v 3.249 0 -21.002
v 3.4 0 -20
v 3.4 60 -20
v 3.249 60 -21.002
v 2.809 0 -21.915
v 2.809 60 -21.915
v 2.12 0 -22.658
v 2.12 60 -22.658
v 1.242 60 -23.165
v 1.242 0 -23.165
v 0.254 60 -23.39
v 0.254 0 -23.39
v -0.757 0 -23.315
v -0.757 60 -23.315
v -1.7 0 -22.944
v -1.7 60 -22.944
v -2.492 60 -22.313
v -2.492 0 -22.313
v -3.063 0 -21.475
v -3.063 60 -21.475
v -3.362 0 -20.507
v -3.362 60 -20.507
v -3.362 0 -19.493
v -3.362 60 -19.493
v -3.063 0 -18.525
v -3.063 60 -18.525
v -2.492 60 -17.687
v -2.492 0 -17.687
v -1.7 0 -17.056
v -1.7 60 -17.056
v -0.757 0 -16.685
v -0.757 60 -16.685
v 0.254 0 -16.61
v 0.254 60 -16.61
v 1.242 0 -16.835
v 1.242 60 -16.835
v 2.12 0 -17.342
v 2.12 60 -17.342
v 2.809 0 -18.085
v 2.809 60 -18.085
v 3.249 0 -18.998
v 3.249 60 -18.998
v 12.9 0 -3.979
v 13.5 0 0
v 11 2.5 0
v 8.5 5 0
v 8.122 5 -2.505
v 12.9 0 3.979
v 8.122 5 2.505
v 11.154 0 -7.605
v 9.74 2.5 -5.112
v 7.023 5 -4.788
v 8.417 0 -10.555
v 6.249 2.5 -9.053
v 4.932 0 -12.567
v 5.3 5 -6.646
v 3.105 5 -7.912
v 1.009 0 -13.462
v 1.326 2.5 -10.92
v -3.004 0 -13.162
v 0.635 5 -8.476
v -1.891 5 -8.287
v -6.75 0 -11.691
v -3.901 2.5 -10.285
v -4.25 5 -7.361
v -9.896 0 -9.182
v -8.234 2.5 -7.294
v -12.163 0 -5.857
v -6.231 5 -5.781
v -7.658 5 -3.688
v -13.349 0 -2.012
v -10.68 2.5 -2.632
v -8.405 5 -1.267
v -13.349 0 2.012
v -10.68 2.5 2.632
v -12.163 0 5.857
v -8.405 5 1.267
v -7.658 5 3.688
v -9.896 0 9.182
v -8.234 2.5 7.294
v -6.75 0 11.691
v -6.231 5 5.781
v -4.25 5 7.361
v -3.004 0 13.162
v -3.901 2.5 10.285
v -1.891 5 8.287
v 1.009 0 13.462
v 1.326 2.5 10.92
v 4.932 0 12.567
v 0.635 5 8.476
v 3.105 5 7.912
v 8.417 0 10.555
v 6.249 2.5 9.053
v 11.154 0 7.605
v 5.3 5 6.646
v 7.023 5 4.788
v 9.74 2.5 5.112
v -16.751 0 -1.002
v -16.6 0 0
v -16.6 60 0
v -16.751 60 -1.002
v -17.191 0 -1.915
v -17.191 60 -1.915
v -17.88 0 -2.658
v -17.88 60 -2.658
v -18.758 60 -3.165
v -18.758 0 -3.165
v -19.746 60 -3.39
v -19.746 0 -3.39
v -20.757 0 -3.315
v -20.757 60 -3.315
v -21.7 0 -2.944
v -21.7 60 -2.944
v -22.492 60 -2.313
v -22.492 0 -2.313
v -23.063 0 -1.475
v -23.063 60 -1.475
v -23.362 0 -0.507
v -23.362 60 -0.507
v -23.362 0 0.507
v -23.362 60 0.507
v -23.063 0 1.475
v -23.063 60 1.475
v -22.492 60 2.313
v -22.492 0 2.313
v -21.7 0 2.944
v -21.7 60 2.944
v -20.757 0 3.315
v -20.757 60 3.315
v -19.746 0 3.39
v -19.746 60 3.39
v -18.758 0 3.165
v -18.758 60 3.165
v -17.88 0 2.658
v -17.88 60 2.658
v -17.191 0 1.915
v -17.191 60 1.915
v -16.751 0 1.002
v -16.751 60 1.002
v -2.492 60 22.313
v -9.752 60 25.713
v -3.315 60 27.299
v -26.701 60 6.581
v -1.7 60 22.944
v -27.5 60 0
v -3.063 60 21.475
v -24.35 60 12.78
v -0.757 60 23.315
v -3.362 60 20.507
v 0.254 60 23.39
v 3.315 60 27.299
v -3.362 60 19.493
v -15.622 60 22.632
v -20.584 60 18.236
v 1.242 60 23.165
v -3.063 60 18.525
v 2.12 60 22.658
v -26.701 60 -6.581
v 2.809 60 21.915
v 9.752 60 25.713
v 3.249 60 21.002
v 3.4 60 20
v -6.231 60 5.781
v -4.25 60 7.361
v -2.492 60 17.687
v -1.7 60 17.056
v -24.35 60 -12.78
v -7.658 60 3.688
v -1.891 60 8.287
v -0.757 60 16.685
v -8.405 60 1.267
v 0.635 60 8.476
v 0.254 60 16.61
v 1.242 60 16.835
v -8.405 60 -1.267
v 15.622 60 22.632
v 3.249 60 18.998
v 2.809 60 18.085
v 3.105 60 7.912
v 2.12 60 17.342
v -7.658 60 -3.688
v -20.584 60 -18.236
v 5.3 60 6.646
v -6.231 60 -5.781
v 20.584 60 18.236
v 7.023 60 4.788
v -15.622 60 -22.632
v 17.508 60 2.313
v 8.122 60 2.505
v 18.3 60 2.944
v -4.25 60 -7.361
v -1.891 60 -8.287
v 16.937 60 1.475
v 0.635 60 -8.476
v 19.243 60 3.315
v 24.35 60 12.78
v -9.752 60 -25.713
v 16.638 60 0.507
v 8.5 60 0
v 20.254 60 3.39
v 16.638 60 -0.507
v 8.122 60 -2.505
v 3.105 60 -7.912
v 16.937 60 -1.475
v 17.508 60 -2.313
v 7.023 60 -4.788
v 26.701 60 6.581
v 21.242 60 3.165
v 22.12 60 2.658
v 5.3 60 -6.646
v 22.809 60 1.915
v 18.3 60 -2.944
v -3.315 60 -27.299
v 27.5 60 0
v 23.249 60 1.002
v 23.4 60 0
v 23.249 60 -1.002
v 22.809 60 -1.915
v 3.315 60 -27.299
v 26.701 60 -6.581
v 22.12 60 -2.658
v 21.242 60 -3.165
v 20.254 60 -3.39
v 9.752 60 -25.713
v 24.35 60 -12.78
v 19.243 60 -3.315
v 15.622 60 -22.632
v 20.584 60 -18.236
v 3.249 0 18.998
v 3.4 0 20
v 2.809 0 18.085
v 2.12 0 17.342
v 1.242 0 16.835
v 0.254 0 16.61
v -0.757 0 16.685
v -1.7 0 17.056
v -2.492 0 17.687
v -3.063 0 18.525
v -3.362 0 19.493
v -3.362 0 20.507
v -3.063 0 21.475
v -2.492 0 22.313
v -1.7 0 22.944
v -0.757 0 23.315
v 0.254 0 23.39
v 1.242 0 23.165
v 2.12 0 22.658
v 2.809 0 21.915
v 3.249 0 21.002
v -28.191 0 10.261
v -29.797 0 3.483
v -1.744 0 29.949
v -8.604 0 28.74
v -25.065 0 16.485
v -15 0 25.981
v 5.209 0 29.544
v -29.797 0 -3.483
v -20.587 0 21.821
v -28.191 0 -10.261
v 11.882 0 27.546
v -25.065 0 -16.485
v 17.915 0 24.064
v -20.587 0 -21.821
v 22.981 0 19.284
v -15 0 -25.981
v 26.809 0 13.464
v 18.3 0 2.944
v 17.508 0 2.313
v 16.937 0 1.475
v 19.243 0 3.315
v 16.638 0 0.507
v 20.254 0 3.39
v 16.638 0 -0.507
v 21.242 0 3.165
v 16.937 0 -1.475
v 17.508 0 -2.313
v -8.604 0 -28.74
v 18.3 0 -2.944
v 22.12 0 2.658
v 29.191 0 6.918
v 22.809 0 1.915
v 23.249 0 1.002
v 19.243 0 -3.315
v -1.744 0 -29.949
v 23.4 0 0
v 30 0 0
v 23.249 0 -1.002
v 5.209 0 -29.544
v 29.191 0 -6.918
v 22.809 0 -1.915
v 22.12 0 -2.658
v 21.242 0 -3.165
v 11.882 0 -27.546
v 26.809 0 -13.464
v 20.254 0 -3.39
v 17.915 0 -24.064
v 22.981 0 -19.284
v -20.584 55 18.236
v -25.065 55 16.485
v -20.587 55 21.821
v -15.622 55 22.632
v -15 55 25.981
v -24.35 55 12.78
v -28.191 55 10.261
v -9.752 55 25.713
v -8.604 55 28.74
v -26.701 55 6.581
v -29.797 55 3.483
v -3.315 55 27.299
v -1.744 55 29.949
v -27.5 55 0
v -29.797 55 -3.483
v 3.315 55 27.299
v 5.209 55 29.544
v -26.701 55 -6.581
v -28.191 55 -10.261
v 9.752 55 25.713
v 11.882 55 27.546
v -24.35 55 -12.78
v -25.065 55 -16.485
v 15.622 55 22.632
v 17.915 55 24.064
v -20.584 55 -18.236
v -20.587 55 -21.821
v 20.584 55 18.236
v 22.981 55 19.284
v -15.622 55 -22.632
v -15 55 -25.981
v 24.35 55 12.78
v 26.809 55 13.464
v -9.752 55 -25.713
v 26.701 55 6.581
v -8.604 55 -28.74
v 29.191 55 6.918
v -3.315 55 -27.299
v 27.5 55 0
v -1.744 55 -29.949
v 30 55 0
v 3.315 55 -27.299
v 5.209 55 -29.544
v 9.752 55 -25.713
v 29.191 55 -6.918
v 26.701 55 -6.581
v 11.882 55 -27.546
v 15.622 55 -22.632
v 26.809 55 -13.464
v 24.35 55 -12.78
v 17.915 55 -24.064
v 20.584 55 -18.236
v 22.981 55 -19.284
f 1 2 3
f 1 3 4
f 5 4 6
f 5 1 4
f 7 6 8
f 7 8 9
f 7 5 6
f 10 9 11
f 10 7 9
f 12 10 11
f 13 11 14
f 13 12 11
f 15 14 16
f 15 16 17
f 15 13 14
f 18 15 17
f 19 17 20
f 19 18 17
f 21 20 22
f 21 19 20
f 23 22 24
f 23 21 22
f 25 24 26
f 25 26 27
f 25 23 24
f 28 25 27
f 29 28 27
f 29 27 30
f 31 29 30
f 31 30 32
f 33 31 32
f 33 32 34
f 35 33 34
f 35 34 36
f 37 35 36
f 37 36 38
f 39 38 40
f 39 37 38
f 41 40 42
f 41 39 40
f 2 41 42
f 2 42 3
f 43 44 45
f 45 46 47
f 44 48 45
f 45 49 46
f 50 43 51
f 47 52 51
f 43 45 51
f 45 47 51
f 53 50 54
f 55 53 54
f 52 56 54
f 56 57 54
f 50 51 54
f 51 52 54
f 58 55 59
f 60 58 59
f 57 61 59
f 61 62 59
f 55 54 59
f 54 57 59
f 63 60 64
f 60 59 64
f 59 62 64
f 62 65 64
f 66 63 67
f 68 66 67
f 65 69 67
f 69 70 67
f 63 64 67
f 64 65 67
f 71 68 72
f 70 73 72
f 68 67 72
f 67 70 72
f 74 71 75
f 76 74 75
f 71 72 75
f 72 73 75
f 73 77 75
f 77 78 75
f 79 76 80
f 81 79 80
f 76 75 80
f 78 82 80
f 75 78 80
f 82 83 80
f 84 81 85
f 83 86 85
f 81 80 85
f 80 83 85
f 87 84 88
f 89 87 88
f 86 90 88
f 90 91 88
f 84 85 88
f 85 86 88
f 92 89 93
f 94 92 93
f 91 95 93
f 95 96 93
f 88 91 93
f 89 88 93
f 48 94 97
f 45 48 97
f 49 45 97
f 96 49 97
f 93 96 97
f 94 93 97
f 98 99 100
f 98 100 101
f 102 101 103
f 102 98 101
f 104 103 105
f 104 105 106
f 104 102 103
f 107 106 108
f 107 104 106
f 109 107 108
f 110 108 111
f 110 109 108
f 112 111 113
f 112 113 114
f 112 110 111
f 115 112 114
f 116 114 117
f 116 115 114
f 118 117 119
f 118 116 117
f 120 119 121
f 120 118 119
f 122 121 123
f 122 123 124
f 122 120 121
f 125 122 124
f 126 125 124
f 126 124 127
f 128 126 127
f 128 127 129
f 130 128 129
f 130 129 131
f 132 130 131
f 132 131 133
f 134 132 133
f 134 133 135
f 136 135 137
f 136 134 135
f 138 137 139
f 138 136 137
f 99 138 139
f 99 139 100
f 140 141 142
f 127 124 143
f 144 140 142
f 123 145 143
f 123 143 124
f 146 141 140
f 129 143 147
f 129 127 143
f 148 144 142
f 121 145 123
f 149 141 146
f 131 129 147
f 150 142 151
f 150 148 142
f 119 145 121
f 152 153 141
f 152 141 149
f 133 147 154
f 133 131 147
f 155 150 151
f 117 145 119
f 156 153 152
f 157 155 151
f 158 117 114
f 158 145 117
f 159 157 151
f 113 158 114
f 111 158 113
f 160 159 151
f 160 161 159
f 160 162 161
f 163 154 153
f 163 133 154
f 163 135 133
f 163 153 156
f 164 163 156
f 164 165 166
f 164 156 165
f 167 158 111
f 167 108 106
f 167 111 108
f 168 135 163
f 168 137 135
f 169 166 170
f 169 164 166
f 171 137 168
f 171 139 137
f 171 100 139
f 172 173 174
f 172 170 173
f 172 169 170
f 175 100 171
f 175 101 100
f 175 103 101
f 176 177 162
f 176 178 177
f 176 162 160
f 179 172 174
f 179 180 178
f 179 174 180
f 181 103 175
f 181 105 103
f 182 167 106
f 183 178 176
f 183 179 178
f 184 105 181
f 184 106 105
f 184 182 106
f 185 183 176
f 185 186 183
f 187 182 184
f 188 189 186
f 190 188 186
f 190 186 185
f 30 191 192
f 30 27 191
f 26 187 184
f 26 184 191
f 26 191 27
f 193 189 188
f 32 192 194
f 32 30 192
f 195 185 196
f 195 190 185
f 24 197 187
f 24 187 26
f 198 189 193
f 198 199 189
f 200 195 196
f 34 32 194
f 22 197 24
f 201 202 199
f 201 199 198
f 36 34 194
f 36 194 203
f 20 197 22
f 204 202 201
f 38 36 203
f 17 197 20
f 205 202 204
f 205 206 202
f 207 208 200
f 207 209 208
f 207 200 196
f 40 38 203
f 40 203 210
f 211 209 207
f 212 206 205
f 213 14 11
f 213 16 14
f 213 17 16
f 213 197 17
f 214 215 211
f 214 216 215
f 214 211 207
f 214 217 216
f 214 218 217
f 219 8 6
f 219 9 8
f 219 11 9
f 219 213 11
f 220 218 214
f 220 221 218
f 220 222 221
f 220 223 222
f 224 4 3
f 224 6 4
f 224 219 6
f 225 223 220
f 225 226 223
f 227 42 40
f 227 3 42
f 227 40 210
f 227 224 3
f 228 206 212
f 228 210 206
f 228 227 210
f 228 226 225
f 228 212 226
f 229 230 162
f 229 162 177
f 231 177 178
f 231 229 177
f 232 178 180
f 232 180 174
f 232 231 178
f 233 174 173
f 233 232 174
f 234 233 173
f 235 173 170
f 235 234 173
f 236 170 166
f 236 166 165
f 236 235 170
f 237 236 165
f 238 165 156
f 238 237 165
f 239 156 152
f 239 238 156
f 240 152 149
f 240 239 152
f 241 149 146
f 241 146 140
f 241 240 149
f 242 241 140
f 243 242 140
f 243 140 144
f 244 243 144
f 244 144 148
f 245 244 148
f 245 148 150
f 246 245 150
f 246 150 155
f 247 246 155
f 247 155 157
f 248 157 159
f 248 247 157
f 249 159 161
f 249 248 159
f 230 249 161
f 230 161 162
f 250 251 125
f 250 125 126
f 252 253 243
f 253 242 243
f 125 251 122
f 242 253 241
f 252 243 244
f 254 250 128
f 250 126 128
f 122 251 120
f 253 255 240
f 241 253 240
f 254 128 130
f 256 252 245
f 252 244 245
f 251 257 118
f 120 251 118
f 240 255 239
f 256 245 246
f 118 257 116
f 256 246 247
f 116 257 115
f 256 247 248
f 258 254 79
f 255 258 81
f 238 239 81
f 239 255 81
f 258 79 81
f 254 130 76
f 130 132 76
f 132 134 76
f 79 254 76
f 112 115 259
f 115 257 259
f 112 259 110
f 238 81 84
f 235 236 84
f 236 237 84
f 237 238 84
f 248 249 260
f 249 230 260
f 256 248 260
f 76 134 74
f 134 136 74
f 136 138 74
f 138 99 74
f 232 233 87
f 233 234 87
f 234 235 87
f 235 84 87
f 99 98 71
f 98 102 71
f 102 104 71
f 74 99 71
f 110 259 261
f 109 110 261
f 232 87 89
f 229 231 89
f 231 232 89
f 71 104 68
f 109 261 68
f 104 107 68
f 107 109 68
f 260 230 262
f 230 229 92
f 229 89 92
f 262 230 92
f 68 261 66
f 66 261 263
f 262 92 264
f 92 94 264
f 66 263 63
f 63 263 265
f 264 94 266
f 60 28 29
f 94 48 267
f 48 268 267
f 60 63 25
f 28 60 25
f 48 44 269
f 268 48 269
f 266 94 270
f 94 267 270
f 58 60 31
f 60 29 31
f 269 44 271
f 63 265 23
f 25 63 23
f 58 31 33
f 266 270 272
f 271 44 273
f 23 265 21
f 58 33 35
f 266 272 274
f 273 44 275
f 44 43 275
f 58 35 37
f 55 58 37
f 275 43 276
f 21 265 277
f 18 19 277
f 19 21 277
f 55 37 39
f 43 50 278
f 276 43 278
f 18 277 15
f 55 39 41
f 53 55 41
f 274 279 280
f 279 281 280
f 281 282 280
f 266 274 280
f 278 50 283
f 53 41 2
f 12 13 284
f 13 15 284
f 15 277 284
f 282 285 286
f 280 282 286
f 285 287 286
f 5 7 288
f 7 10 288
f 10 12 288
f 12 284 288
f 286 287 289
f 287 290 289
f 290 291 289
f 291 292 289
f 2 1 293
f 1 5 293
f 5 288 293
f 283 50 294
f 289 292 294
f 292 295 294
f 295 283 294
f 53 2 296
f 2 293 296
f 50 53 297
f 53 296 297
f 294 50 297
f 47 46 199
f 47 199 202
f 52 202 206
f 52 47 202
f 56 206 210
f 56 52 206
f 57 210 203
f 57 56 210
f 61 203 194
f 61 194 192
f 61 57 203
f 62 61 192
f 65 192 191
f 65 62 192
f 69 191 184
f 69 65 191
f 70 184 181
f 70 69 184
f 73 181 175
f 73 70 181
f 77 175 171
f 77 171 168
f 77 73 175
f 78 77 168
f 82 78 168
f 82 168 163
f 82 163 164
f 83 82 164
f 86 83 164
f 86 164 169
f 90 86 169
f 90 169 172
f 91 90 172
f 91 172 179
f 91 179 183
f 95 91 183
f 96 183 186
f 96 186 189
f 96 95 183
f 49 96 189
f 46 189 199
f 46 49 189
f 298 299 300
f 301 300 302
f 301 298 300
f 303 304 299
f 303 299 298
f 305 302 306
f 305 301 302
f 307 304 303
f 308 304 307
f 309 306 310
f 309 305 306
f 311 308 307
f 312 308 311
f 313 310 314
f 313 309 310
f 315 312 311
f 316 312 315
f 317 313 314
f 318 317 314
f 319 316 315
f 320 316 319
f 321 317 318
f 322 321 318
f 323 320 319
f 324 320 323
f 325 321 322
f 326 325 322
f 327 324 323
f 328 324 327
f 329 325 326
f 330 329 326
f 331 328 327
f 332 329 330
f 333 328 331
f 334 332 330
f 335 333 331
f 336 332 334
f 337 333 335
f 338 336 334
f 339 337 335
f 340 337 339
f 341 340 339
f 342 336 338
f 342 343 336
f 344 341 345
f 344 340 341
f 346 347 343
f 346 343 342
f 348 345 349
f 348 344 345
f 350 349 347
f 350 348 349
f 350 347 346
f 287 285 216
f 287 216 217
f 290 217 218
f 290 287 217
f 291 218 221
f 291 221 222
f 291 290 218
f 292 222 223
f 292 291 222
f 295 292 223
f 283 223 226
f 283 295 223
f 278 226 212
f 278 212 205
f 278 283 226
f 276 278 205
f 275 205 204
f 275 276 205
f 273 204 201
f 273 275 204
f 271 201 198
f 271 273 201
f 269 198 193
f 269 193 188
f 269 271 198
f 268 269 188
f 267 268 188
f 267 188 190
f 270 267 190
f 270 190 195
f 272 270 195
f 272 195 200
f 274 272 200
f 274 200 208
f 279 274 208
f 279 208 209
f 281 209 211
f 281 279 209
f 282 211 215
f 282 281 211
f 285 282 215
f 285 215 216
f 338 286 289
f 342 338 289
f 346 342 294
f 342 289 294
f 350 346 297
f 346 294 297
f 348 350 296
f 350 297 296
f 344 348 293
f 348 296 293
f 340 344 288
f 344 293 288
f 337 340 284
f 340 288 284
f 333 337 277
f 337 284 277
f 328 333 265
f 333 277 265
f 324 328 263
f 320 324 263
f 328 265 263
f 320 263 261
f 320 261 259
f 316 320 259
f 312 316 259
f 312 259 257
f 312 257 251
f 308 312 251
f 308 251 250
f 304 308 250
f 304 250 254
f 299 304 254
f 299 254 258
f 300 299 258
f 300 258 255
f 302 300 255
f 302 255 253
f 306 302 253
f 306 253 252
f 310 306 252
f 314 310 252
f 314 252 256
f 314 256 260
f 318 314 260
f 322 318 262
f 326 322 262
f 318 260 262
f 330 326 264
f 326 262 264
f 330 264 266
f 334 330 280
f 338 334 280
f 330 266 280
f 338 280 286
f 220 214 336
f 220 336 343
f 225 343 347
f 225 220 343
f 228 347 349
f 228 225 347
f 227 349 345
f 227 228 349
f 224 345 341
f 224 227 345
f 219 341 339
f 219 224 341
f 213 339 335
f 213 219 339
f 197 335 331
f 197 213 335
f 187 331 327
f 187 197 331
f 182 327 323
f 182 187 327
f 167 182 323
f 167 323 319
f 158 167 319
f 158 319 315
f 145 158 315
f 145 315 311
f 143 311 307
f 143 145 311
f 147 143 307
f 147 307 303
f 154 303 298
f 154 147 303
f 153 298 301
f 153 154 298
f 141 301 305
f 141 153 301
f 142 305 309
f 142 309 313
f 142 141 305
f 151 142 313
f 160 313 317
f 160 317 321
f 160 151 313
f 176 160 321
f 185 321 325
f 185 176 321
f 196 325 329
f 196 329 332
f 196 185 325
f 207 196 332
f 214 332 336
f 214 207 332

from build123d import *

# Parameters (mm, degrees)
SKETCH1_R           = 30
SKETCH1_R_2         = 8.5
SKETCH1_R_3         = 3.4
BOSS_EXTRUDE1_DEPTH = 60
SKETCH3_R           = 30
SKETCH3_R_2         = 27.5
CUT_EXTRUDE1_DEPTH  = 5
CHAMFER1_SIZE       = 5


with BuildPart() as part:
    # Sketch1 → Boss-Extrude1 (new body)
    with BuildSketch(Plane(origin=(0, 0, 0), x_dir=(1, 0, 0), z_dir=(0, 1, 0))):
        Circle(SKETCH1_R)
        Circle(SKETCH1_R_2, mode=Mode.SUBTRACT)
        with Locations((-20, 0)):
            Circle(SKETCH1_R_3, mode=Mode.SUBTRACT)
        with Locations((0, 20)):
            Circle(SKETCH1_R_3, mode=Mode.SUBTRACT)
        with Locations((20, 0)):
            Circle(SKETCH1_R_3, mode=Mode.SUBTRACT)
        with Locations((0, -20)):
            Circle(SKETCH1_R_3, mode=Mode.SUBTRACT)
    extrude(amount=BOSS_EXTRUDE1_DEPTH)

    # Sketch3 → Cut-Extrude1 (cut)
    with BuildSketch(Plane(origin=(0, 60, 0), x_dir=(1, 0, 0), z_dir=(0, 1, 0))):
        Circle(SKETCH3_R)
        Circle(SKETCH3_R_2, mode=Mode.SUBTRACT)
    extrude(amount=-CUT_EXTRUDE1_DEPTH, mode=Mode.SUBTRACT)

    # Chamfer1
    chamfer1_edges = [part.edges().sort_by_distance(p)[0] for p in [
        (-8.5, 0, 0),
    ]]
    chamfer(chamfer1_edges, length=CHAMFER1_SIZE)


solid = part.part
